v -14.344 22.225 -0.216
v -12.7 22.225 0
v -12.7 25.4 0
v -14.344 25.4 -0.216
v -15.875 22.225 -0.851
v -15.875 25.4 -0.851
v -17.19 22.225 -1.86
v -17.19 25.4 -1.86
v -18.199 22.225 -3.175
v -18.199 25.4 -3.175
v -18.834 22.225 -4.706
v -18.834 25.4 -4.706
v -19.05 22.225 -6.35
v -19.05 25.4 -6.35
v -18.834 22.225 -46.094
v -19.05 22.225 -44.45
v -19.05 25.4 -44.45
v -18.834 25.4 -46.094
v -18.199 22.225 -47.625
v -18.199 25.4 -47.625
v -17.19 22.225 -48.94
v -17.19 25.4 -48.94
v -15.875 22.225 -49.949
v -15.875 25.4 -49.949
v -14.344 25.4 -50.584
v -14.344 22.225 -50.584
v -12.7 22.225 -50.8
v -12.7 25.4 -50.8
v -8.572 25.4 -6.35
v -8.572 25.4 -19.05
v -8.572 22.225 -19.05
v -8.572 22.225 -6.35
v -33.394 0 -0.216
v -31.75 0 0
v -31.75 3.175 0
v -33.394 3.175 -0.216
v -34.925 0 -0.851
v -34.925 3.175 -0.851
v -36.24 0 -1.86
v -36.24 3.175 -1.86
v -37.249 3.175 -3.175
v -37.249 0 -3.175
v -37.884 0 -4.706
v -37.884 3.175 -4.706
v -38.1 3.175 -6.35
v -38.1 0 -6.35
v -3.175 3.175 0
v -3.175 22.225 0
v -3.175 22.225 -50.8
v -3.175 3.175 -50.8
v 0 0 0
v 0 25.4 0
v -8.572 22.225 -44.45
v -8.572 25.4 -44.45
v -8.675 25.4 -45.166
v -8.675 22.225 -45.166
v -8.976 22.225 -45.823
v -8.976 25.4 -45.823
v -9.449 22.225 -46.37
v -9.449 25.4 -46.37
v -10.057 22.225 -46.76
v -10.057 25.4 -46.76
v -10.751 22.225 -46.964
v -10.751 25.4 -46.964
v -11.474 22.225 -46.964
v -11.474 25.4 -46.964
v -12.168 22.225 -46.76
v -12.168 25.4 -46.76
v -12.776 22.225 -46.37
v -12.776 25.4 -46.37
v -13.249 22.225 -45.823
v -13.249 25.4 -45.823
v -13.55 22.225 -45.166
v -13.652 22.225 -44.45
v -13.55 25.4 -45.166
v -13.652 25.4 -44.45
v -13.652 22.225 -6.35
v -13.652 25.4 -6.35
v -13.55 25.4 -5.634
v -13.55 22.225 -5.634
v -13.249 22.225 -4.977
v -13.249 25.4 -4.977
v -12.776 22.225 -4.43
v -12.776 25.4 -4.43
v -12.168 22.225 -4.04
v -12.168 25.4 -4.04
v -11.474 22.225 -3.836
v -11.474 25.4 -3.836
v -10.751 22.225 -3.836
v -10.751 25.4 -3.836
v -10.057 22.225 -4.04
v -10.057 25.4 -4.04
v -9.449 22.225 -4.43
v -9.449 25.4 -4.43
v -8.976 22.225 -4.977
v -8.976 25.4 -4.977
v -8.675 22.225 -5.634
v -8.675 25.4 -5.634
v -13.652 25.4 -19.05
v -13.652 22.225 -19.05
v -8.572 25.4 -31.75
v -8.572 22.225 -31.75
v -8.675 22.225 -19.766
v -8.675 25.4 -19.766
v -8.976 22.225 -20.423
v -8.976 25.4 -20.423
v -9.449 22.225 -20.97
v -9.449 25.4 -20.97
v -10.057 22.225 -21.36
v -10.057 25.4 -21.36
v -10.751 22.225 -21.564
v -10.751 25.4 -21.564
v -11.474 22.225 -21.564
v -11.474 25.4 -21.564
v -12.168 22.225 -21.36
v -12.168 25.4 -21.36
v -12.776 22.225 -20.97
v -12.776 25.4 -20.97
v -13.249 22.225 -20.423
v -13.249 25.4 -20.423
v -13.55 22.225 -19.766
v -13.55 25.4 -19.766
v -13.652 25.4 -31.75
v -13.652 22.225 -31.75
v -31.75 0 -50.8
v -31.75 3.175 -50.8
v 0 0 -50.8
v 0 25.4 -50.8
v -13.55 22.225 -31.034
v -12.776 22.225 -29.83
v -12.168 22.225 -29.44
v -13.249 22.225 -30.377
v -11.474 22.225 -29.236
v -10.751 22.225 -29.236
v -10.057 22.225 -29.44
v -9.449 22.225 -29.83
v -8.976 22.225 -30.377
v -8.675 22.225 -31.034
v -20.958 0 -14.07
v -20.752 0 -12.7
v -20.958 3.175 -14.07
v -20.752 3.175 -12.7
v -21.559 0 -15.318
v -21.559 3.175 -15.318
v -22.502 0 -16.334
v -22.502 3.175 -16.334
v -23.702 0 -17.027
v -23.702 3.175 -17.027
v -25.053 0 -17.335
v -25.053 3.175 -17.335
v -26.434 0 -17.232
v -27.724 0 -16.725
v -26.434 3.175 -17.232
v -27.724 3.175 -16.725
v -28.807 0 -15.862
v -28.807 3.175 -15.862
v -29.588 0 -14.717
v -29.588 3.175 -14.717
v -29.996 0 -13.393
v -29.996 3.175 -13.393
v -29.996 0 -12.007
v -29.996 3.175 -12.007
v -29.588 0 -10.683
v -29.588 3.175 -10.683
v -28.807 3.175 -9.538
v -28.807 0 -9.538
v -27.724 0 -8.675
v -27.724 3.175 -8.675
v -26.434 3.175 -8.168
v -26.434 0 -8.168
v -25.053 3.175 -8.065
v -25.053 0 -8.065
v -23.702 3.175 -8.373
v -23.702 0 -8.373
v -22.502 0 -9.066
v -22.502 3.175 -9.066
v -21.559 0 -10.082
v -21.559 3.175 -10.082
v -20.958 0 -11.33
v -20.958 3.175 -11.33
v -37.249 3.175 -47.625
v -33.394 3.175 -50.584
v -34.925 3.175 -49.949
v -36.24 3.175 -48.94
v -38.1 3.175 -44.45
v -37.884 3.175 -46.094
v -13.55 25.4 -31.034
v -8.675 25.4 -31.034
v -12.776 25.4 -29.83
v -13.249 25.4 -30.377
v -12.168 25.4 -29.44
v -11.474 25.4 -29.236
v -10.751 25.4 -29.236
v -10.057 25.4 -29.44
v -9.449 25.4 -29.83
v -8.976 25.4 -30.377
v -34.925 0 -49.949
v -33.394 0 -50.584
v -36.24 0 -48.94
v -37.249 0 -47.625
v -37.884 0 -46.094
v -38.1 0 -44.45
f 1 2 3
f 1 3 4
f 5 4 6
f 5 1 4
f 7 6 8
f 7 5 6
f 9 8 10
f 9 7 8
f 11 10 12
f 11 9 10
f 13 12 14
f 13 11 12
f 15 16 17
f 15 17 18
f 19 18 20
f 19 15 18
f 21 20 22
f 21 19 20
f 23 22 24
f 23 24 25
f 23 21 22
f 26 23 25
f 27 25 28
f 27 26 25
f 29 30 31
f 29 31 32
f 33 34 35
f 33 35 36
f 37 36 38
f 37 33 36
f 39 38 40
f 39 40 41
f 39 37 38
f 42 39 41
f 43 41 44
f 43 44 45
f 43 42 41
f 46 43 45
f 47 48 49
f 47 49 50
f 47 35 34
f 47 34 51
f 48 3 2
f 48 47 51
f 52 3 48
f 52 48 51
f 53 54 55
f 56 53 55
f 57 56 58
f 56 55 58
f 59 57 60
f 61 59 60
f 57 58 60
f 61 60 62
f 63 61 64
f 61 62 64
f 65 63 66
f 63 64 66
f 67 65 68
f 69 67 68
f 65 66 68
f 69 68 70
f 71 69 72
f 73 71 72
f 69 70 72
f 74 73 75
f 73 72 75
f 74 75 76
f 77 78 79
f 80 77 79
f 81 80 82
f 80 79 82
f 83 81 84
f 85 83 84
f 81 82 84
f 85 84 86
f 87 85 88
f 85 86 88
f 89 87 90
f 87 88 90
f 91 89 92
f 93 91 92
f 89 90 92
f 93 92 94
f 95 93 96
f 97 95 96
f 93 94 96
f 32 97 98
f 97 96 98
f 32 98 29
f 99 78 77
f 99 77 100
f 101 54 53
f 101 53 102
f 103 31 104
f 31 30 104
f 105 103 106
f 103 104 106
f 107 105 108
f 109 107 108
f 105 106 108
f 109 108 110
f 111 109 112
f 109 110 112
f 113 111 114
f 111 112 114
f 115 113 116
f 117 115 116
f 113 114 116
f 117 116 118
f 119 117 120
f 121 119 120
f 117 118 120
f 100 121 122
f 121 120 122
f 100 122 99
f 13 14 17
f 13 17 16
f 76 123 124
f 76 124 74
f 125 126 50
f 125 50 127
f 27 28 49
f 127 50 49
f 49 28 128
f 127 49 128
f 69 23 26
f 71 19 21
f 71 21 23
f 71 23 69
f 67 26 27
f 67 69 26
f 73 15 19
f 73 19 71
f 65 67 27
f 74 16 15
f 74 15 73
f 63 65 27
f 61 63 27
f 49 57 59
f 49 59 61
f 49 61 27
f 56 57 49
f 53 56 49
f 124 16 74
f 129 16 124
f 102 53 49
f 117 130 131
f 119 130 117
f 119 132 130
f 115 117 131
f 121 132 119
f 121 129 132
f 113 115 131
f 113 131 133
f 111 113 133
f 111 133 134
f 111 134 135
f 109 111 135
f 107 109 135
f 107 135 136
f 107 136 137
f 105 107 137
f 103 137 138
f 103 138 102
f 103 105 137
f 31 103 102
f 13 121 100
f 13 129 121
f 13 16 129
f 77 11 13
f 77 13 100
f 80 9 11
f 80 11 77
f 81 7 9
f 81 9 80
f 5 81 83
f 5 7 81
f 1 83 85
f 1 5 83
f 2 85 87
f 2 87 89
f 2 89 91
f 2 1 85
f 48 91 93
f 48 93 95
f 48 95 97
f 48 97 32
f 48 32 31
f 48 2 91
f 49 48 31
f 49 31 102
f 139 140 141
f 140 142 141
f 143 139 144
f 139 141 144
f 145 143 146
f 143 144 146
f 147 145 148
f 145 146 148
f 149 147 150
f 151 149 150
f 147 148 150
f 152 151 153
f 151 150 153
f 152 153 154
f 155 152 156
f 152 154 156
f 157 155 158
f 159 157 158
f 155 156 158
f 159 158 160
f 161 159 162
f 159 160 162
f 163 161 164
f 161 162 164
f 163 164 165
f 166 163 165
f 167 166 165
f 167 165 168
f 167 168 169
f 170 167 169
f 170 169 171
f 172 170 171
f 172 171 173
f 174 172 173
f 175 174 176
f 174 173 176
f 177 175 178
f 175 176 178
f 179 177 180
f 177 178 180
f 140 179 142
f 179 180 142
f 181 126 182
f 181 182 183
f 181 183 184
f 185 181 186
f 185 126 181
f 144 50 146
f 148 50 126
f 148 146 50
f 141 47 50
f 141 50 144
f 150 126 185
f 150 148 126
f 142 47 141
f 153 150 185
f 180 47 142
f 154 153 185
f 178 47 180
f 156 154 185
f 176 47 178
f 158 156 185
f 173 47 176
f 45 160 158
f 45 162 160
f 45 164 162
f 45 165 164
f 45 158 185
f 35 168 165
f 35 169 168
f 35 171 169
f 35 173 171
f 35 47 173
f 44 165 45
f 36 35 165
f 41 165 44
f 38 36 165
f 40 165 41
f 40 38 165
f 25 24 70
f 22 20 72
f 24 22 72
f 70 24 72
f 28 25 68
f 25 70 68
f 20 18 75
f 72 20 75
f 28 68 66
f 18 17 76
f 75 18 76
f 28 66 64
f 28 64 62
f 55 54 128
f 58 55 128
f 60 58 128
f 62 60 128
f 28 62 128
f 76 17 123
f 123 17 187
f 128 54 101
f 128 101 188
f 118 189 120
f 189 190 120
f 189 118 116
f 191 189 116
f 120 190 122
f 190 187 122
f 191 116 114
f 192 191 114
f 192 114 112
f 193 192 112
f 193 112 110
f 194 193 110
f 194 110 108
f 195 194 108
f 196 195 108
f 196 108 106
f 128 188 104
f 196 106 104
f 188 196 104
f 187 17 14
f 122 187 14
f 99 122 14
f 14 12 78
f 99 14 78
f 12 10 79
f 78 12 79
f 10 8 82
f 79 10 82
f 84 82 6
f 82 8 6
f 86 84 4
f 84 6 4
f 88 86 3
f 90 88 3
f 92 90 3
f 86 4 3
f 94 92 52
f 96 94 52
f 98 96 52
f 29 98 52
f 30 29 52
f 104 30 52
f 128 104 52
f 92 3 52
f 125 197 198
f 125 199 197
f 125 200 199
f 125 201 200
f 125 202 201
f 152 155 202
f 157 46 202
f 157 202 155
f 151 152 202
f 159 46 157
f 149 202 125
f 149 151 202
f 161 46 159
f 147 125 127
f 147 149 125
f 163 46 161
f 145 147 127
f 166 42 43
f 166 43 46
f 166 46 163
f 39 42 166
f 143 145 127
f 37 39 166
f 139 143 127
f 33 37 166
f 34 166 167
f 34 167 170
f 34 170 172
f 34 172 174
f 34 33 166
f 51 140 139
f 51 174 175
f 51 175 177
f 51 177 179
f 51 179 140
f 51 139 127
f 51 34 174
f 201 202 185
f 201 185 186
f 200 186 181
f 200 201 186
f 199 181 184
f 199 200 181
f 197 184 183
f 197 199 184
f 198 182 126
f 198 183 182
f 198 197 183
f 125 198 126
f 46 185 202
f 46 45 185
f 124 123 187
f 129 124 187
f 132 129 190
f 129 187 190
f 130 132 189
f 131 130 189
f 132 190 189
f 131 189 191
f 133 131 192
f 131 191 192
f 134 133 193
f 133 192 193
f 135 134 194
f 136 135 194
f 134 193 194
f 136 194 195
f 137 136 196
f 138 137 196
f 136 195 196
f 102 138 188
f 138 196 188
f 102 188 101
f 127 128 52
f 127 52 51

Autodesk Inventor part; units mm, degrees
ref_plane "YZ Plane" through (0, 0, 0) normal (1, 0, 0) x (0, 1, 0)
ref_plane "XZ Plane" through (0, 0, 0) normal (0, 1, 0) x (-1, 0, 0)
ref_plane "XY Plane" through (0, 0, 0) normal (0, 0, 1) x (1, 0, 0)
sketch "Sketch1" plane through (0, 0, 0) normal (0, 0, 1) x (1, 0, 0)
  line L0 (-19.05, 25.4) -> (0, 25.4)
  line L1 (0, 25.4) -> (0, 0)
  line L2 (-19.05, 25.4) -> (-19.05, 22.225)
  line L3 (-19.05, 22.225) -> (-3.175, 22.225)
  line L4 (-3.175, 22.225) -> (-3.175, 3.175)
  line L5 (-3.175, 3.175) -> (-38.1, 3.175)
  line L6 (-38.1, 3.175) -> (-38.1, 0)
  line L7 (-38.1, 0) -> (0, 0)
  dimension "d2" = 3.175
  dimension "d3" = 3.175
  dimension "d4" = 3.175
  dimension "d16" = 19.05
  dimension "d17" = 38.1
  dimension "d18" = 34.925
  dimension "d19" = 15.875
  dimension "d20" = 25.4
extrude "Extrusion1" add sketch "Sketch1" against normal blind 50.8
sketch "Sketch2" plane through (-38.1, 3.175, 0) normal (0, 1, 0) x (1, 0, 0)
  line L0 (34.925, 0) -> (0, 0) projected
  line L1 (34.925, 0) -> (34.925, 50.8) projected
  circle A0 centre (12.7, 12.7) radius 4.6482
  point P0 (38.1, 0)
  dimension "d9" = 9.2964
  dimension "d10" = 22.225
  dimension "d11" = 12.7
extrude "Extrusion2" cut sketch "Sketch2" against normal blind 50.8
thread "Thread1" size "3/8-16 UNC" class "2B" standard "ANSI Unified Screw Threads" full length
sketch "Sketch3" plane through (-19.05, 25.4, 0) normal (0, 1, 0) x (1, 0, 0)
  line L0 (19.05, 50.8) -> (0, 50.8) projected
  line L1 (0, 0) -> (0, 50.8) projected
  line L2 (19.05, 0) -> (19.05, 50.8) projected
  line L3 (5.3975, 19.05) -> (10.4775, 19.05)
  line L4 (10.4775, 19.05) -> (10.4775, 6.35)
  line L5 (10.4775, 6.35) -> (5.3975, 6.35)
  line L6 (5.3975, 6.35) -> (5.3975, 19.05)
  arc A0 (10.4775, 19.05) -> (5.3975, 19.05) centre (7.9375, 19.05) ccw
  arc A1 (5.3975, 6.35) -> (10.4775, 6.35) centre (7.9375, 6.35) ccw
  line L7 (5.3975, 44.45) -> (10.4775, 44.45)
  line L8 (10.4775, 44.45) -> (10.4775, 31.75)
  line L9 (10.4775, 31.75) -> (5.3975, 31.75)
  line L10 (5.3975, 31.75) -> (5.3975, 44.45)
  arc A2 (10.4775, 44.45) -> (5.3975, 44.45) centre (7.9375, 44.45) ccw
  arc A3 (5.3975, 31.75) -> (10.4775, 31.75) centre (7.9375, 31.75) ccw
  dimension "d21" = 12.7
  dimension "d22" = 5.08
  dimension "d23" = 31.75
  dimension "d24" = 11.1125
  dimension "d27" = 25.4
extrude "Extrusion3" cut sketch "Sketch3" against normal blind 12.7
fillet "Fillet1" radius 6.35 4 edges at (-19.05, 23.8125, 0) (-38.1, 1.5875, 0) (-19.05, 23.8125, -50.8) (-38.1, 1.5875, -50.8)
properties part number "turn encoder mount"
